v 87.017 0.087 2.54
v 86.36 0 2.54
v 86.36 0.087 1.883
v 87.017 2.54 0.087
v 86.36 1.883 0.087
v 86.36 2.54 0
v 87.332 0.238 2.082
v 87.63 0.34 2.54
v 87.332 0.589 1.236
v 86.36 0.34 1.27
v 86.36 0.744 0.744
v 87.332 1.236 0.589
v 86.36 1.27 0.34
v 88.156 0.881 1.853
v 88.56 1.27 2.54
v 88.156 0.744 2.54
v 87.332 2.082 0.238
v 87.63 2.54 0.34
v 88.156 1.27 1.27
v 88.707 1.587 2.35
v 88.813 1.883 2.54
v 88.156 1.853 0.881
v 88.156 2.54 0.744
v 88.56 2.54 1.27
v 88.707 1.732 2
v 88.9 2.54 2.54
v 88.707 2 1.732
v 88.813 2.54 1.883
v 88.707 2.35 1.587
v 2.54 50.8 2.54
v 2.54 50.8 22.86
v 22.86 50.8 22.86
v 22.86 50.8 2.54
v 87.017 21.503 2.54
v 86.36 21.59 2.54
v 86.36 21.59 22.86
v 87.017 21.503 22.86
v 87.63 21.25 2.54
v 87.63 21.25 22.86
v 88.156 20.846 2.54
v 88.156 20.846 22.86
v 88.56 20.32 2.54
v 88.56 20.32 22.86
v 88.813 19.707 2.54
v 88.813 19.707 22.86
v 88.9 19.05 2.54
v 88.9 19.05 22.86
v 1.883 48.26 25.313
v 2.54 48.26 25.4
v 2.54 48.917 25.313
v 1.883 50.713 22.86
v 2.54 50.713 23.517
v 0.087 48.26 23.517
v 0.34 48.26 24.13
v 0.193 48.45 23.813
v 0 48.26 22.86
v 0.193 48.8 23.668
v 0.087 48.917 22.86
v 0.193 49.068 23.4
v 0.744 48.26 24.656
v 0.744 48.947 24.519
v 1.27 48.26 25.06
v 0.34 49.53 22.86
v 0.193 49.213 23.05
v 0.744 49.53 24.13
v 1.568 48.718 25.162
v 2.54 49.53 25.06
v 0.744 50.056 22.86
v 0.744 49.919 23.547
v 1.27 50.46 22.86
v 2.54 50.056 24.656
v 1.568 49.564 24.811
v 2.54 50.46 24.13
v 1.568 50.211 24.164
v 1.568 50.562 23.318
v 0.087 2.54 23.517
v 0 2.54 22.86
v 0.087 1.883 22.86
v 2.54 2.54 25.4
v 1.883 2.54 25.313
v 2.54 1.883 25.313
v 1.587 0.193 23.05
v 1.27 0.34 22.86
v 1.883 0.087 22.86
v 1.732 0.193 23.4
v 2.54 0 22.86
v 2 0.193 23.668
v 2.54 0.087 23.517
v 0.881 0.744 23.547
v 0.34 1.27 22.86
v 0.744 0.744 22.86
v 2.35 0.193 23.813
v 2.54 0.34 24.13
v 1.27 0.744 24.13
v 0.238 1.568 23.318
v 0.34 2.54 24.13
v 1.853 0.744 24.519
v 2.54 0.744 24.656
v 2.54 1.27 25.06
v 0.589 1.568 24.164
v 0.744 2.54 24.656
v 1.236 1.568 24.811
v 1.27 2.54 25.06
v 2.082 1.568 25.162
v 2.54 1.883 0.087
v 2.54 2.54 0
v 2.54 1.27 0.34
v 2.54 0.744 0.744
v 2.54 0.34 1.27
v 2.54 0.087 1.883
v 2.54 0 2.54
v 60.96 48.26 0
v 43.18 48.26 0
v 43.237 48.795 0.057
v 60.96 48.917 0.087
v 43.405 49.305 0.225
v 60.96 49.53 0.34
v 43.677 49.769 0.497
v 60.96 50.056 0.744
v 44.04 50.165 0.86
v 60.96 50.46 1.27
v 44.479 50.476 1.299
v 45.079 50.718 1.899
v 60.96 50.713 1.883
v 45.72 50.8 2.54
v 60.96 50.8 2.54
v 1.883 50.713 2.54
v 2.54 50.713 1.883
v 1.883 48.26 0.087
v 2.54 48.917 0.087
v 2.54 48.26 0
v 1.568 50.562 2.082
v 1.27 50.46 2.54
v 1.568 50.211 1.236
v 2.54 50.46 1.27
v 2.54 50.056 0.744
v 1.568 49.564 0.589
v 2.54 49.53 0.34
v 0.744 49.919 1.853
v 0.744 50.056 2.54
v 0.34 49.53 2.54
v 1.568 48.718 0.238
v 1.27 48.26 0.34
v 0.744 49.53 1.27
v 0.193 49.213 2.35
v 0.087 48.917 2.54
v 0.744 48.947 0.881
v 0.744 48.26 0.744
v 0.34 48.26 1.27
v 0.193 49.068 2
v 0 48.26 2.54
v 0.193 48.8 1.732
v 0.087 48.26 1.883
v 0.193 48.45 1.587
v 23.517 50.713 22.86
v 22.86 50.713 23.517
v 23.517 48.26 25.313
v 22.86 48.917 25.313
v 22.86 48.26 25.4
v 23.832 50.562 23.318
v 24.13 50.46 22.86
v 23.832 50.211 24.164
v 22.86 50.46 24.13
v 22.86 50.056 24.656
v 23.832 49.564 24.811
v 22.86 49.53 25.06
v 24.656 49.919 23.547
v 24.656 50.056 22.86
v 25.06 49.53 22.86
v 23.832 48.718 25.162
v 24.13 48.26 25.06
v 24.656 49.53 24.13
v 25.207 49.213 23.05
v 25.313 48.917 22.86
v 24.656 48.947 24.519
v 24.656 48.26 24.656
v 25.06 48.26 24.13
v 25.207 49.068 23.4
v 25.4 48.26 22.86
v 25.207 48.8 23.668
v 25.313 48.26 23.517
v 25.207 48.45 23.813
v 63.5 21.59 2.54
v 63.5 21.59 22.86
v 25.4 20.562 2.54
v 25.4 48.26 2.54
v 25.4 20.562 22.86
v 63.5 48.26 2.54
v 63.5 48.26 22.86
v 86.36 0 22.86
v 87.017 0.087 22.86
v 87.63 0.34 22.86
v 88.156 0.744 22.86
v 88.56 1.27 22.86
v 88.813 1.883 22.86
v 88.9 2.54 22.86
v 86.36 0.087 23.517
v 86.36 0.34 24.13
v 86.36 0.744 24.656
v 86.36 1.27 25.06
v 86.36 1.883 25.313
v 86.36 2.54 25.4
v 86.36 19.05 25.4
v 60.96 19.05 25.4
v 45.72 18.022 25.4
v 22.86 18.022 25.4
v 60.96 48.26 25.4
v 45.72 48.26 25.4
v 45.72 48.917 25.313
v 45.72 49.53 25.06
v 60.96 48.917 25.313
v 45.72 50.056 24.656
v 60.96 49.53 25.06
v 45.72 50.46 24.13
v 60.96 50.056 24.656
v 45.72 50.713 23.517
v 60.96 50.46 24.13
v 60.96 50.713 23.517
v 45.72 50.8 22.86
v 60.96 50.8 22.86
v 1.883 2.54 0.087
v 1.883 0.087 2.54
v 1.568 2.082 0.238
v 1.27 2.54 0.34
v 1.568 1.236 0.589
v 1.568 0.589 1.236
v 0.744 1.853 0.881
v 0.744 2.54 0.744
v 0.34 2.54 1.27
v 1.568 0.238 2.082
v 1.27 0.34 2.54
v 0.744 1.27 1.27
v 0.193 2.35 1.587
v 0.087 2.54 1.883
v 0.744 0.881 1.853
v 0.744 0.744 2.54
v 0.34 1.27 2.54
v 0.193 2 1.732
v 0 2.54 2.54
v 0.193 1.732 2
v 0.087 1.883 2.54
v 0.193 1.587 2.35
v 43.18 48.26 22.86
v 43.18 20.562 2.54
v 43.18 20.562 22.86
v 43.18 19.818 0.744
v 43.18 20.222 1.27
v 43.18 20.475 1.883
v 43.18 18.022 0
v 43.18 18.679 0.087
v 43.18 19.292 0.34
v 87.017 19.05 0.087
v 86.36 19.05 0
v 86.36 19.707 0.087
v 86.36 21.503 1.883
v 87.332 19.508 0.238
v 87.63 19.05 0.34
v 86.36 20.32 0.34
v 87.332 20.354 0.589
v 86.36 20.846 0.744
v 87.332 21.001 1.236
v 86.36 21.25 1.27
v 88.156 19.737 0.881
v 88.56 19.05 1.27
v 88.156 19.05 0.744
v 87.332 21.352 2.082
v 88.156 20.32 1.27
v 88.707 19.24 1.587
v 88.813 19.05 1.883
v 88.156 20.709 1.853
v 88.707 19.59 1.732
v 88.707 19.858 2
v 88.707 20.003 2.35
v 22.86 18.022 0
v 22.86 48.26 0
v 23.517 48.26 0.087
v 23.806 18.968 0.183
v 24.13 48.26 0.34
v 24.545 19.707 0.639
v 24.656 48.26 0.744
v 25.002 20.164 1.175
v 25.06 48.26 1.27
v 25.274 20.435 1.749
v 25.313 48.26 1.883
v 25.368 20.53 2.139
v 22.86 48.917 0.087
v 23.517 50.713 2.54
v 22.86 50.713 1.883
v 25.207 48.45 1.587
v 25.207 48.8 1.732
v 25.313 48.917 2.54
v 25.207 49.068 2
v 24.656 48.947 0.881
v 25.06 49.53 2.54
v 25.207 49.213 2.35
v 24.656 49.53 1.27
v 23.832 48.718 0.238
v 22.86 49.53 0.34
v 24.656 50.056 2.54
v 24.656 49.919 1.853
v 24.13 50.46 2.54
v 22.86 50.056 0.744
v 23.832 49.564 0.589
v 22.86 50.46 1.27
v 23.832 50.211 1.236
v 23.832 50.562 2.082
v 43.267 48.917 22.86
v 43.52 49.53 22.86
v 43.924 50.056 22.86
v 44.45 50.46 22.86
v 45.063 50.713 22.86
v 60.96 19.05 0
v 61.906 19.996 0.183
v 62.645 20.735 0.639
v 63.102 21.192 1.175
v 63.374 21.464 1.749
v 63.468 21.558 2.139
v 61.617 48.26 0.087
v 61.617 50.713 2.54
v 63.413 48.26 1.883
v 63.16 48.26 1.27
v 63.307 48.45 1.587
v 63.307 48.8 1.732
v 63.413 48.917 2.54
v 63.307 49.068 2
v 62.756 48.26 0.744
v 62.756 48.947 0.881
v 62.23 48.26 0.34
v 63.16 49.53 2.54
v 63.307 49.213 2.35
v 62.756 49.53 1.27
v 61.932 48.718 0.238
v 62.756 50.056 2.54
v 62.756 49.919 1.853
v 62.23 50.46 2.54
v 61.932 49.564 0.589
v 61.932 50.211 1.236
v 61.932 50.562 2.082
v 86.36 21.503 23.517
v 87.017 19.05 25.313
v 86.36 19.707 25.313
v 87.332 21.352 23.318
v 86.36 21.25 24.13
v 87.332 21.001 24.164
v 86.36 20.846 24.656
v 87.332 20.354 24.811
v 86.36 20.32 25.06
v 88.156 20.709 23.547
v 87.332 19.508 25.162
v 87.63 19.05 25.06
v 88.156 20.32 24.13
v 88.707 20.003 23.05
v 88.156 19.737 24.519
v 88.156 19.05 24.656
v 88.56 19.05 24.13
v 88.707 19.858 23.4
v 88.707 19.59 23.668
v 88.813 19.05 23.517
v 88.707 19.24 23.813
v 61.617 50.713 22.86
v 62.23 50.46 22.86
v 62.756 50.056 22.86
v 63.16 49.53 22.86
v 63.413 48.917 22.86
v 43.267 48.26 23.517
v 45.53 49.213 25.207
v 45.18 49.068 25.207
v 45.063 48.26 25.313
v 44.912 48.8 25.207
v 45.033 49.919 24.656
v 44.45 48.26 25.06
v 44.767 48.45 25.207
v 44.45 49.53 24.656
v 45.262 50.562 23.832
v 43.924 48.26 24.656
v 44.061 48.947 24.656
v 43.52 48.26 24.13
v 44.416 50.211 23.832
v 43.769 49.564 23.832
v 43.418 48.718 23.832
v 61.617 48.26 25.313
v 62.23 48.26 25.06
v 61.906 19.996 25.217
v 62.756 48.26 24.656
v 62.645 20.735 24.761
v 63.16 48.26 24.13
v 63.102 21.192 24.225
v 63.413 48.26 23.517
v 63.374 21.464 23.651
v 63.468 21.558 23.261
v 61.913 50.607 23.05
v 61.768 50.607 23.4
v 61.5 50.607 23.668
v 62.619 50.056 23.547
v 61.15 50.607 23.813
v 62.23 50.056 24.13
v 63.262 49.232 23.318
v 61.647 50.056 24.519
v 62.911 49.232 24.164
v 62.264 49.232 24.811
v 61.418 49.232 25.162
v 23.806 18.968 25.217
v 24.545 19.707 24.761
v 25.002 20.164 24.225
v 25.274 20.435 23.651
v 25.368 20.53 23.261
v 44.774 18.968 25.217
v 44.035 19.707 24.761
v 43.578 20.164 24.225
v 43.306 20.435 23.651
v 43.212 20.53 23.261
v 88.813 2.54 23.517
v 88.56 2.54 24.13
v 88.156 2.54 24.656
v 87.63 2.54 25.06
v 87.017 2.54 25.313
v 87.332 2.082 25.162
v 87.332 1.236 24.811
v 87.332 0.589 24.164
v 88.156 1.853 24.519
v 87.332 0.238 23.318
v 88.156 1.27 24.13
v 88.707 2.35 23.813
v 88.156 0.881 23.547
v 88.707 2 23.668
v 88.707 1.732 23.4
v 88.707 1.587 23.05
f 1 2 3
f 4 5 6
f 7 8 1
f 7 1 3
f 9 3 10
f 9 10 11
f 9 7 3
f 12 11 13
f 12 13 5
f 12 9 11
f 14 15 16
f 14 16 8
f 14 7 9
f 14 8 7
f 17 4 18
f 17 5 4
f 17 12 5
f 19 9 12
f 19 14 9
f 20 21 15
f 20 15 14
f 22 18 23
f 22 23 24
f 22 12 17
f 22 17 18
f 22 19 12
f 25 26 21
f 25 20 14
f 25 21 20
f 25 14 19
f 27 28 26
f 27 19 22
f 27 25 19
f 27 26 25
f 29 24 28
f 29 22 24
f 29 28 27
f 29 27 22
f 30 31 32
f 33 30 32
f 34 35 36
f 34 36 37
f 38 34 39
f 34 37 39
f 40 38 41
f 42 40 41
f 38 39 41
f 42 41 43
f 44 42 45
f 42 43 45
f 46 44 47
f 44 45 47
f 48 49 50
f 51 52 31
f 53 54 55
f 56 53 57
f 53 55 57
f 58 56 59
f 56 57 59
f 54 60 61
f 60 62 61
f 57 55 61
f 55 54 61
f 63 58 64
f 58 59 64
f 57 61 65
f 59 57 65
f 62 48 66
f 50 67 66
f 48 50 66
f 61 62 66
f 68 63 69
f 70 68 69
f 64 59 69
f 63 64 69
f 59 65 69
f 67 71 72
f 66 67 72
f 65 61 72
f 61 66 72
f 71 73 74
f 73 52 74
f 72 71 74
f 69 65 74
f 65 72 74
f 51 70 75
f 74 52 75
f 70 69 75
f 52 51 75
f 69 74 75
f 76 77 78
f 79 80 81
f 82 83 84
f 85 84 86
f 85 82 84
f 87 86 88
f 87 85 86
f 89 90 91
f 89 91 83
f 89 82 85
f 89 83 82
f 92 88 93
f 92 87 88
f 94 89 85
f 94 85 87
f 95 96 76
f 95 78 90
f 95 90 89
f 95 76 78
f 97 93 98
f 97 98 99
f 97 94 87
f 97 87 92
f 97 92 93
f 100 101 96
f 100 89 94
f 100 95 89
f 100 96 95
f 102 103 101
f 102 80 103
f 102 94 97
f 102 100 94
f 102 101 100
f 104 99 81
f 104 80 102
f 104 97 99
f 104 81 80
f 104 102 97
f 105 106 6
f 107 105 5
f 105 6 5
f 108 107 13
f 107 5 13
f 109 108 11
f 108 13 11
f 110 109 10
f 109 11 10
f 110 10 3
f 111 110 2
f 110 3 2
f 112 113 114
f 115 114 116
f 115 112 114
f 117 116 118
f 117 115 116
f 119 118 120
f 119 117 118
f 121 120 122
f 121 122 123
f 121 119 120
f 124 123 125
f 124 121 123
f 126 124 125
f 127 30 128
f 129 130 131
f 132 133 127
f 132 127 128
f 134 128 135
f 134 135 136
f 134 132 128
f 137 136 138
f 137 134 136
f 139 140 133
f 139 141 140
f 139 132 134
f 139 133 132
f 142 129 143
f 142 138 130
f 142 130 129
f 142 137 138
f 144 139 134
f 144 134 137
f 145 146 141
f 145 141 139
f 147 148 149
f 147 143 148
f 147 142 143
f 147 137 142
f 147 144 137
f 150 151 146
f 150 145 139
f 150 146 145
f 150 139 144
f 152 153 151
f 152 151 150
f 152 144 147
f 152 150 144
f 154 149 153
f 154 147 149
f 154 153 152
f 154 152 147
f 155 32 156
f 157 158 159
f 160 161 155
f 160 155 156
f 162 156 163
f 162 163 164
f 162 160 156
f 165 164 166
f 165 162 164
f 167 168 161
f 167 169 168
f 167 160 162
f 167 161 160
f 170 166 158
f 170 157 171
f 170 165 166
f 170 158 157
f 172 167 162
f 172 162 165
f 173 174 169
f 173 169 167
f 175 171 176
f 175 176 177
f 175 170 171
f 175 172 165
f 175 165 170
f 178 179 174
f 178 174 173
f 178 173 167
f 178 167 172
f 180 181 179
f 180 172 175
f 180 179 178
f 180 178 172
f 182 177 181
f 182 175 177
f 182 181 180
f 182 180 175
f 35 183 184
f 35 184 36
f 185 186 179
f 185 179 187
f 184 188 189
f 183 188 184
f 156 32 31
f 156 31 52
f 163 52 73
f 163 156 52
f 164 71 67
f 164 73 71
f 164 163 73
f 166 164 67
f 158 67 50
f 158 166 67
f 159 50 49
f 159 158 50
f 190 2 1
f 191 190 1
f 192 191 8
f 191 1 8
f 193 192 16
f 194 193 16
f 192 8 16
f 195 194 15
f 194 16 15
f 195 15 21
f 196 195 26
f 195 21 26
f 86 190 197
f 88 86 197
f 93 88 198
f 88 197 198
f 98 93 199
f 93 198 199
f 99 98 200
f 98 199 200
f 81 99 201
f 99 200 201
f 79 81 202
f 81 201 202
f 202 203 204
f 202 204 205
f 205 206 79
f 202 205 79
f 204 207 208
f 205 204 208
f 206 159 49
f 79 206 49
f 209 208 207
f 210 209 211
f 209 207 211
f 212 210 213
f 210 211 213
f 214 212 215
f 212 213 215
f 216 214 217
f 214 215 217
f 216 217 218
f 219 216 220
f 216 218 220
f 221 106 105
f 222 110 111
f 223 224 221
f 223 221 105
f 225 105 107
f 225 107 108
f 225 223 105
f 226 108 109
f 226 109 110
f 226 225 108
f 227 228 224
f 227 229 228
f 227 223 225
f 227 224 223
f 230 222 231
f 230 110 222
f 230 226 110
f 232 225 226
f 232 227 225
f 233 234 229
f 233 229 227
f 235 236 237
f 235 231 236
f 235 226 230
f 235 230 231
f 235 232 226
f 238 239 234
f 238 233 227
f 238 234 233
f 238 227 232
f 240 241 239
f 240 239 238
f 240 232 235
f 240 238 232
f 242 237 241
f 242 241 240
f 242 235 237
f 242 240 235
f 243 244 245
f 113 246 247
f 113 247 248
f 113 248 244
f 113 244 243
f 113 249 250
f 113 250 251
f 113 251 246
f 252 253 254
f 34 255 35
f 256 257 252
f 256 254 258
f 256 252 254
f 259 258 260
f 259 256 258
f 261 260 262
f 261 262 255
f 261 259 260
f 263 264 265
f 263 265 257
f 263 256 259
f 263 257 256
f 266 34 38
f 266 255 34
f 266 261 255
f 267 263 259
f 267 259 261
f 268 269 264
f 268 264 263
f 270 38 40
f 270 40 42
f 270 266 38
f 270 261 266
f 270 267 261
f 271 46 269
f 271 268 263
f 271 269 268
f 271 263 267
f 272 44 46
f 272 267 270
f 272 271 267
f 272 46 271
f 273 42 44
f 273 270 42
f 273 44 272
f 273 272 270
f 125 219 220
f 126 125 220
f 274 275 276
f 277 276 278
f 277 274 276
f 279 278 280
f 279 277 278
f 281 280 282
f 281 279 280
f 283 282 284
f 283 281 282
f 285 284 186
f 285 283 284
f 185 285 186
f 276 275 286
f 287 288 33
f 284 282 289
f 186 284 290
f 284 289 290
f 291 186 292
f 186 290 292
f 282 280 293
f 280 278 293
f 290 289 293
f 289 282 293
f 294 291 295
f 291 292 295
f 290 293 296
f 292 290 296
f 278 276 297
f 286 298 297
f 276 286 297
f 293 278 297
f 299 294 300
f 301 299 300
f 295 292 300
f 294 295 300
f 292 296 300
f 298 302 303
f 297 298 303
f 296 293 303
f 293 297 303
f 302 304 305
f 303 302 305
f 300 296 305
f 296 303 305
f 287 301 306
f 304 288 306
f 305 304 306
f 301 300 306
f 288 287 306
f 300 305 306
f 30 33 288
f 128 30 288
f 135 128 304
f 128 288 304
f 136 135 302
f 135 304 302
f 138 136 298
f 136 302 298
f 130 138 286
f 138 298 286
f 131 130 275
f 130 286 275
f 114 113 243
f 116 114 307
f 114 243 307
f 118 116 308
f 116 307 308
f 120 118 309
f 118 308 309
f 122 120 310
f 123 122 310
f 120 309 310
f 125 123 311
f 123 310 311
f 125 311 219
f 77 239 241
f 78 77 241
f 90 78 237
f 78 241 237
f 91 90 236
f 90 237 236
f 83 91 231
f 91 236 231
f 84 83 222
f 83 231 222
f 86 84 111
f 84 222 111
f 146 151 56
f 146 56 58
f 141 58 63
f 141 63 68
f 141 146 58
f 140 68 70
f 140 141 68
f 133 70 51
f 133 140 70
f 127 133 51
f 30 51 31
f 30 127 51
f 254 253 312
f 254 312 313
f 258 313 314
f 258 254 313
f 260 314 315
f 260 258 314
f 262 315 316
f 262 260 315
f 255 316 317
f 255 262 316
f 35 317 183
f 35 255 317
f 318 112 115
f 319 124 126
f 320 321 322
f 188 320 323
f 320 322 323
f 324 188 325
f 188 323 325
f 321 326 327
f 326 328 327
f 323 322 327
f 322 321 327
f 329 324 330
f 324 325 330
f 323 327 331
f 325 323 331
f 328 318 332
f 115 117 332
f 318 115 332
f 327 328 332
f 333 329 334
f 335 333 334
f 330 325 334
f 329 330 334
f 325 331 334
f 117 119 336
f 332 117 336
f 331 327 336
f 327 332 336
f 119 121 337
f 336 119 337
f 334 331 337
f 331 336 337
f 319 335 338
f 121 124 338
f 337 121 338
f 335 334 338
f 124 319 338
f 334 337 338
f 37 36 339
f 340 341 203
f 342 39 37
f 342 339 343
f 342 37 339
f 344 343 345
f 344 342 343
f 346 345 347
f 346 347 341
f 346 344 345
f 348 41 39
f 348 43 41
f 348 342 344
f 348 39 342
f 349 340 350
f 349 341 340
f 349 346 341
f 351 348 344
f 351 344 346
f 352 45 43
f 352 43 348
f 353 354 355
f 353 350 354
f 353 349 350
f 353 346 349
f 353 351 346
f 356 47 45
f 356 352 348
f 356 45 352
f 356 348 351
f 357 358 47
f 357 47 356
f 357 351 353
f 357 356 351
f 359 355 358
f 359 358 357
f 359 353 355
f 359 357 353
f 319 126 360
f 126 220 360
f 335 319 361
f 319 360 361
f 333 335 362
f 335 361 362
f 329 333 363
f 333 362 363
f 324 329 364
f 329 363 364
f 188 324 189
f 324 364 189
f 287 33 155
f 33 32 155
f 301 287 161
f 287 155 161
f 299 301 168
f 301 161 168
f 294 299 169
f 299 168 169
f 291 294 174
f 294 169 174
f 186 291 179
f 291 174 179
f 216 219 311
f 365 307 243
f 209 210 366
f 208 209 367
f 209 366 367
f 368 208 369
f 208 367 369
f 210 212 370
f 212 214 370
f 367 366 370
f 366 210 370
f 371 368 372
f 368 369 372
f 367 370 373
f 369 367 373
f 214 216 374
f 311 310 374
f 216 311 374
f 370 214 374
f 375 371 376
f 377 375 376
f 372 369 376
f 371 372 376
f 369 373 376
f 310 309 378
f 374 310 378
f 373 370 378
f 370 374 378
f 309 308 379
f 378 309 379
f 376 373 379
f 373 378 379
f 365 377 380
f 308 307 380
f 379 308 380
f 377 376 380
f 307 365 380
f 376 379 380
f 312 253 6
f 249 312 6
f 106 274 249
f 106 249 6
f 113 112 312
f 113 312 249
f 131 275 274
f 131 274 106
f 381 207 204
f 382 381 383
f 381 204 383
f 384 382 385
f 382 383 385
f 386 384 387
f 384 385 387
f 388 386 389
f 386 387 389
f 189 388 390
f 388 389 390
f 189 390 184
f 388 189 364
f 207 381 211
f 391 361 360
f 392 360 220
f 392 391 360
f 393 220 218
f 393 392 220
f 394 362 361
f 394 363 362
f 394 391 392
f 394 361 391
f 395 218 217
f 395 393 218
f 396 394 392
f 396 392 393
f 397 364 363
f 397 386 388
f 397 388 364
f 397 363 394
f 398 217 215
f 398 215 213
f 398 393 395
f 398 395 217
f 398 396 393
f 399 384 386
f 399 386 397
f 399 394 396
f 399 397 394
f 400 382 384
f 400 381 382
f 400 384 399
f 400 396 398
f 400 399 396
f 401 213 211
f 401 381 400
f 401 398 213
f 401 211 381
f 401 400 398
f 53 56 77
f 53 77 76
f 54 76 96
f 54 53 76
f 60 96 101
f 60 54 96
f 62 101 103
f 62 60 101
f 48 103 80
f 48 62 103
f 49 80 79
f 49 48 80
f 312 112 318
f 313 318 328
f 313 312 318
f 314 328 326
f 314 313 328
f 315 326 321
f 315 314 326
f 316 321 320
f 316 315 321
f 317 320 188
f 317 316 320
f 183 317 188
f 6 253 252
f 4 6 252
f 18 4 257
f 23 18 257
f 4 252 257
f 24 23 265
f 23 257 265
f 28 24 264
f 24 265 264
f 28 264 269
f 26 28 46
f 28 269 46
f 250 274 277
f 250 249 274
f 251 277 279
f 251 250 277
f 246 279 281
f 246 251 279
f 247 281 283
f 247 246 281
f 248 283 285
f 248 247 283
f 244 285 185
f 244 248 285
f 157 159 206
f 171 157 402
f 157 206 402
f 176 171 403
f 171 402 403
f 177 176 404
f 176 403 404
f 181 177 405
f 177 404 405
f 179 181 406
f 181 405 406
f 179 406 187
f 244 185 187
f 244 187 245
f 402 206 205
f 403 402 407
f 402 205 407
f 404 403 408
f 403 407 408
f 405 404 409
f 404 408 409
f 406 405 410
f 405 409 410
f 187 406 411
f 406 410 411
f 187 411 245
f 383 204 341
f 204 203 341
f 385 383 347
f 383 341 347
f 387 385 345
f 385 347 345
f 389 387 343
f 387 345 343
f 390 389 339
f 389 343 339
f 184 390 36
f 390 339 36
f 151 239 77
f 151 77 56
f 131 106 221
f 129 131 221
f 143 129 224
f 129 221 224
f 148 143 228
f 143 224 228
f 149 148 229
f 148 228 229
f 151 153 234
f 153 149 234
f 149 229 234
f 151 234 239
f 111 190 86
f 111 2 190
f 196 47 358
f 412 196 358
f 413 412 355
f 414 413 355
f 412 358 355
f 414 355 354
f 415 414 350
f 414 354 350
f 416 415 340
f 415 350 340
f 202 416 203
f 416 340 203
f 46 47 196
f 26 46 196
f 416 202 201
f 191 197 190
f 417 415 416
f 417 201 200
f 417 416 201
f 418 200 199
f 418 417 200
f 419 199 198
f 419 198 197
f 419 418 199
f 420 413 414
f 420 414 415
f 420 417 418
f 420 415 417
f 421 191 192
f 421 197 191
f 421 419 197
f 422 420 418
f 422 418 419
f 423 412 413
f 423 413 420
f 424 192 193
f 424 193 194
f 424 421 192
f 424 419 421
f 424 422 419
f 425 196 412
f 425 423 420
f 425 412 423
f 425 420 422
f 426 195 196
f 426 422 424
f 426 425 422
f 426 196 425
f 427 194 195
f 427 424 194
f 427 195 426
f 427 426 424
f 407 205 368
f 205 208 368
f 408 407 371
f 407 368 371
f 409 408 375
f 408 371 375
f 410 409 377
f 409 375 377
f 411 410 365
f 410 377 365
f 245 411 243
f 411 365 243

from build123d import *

# Parameters (mm, degrees)
BOSS_EXTRUDE2_DEPTH = 25.4
FILLET4_R           = 2.54
FILLET5_R           = 2.54
FILLET6_R           = 2.54


with BuildPart() as part:
    # Sketch1 → Boss-Extrude2 (new body)
    with BuildSketch(Plane.XY):
        Polygon((0, 0), (0, 50.8), (25.4, 50.8), (25.4, 20.561904762), (43.18, 20.561904762), (43.18, 50.8), (63.5, 50.8), (63.5, 21.59), (88.9, 21.59), (88.9, 0), align=None)
    extrude(amount=BOSS_EXTRUDE2_DEPTH)

    # Fillet4
    fillet4_edges = [part.edges().sort_by_distance(p)[0] for p in [
        (12.7, 50.8, 25.4),
    ]]
    fillet(fillet4_edges, radius=FILLET4_R)

    # Fillet5
    fillet5_edges = [part.edges().sort_by_distance(p)[0] for p in [
        (12.7, 50.8, 0),
        (25.4, 35.680952381, 0),
        (34.29, 20.561904762, 0),
        (53.34, 50.8, 0),
        (63.5, 36.195, 0),
        (76.2, 21.59, 25.4),
        (76.2, 21.59, 0),
        (63.5, 36.195, 25.4),
        (43.18, 50.8, 12.7),
        (63.5, 50.8, 12.7),
        (88.9, 21.59, 12.7),
        (53.34, 50.8, 25.4),
        (43.18, 35.680952381, 25.4),
        (34.29, 20.561904762, 25.4),
        (0, 24.13, 25.4),
        (0, 50.8, 11.43),
        (0, 50.056051224, 24.656051224),
        (25.4, 50.8, 11.43),
        (25.4, 50.056051224, 24.656051224),
        (25.4, 34.410952381, 25.4),
    ]]
    fillet(fillet5_edges, radius=FILLET5_R)

    # Fillet6
    # the kernel refuses this fillet: 2.54 mm, written as the material it takes off along each edge
    with BuildSketch(Plane(origin=(86.36, 19.05, 2.54), x_dir=(0, 0, -1), z_dir=(1, 0, 0))) as fillet6_piece_1_section:
        Polygon((0, 0), (FILLET6_R, 0), (FILLET6_R, FILLET6_R), (0, FILLET6_R), align=None)
    fillet6_piece_1 = extrude(amount=FILLET6_R, mode=Mode.PRIVATE)
    fillet6_piece_1 = fillet6_piece_1 - Plane(origin=(86.36, 19.05, 2.54), x_dir=(0, -0.7071067811865475, 0.7071067811865475), z_dir=(1, 0, 0)) * Sphere(FILLET6_R, mode=Mode.PRIVATE)
    add(fillet6_piece_1, mode=Mode.SUBTRACT)
    with BuildSketch(Plane(origin=(86.36, 19.05, 22.86), x_dir=(0, 0, 1), z_dir=(1, 0, 0))) as fillet6_piece_2_section:
        Polygon((0, 0), (FILLET6_R, 0), (FILLET6_R, -FILLET6_R), (0, -FILLET6_R), align=None)
    fillet6_piece_2 = extrude(amount=FILLET6_R, mode=Mode.PRIVATE)
    fillet6_piece_2 = fillet6_piece_2 - Plane(origin=(86.36, 19.05, 22.86), x_dir=(0, -0.7071067811865475, -0.7071067811865475), z_dir=(1, 0, 0)) * Sphere(FILLET6_R, mode=Mode.PRIVATE)
    add(fillet6_piece_2, mode=Mode.SUBTRACT)
    with BuildSketch(Plane(origin=(2.54, 48.26, 2.54), x_dir=(0, 0, -1), z_dir=(-1, 0, 0))) as fillet6_piece_3_section:
        Polygon((0, 0), (FILLET6_R, 0), (FILLET6_R, -FILLET6_R), (0, -FILLET6_R), align=None)
    fillet6_piece_3 = extrude(amount=FILLET6_R, mode=Mode.PRIVATE)
    fillet6_piece_3 = fillet6_piece_3 - Plane(origin=(2.54, 48.26, 2.54), x_dir=(0, -0.7071067811865475, 0.7071067811865475), z_dir=(-1, 0, 0)) * Sphere(FILLET6_R, mode=Mode.PRIVATE)
    add(fillet6_piece_3, mode=Mode.SUBTRACT)
    with BuildSketch(Plane(origin=(86.36, 2.54, 2.54), x_dir=(0, -1, 0), z_dir=(1, 0, 0))) as fillet6_piece_4_section:
        Polygon((0, 0), (FILLET6_R, 0), (FILLET6_R, FILLET6_R), (0, FILLET6_R), align=None)
    fillet6_piece_4 = extrude(amount=FILLET6_R, mode=Mode.PRIVATE)
    fillet6_piece_4 = fillet6_piece_4 - Plane(origin=(86.36, 2.54, 2.54), x_dir=(0, 0.7071067811865475, 0.7071067811865475), z_dir=(1, 0, 0)) * Sphere(FILLET6_R, mode=Mode.PRIVATE)
    add(fillet6_piece_4, mode=Mode.SUBTRACT)
    with BuildSketch(Plane(origin=(2.54, 2.54, 2.54), x_dir=(0, -1, 0), z_dir=(-1, 0, 0))) as fillet6_piece_5_section:
        Polygon((0, 0), (FILLET6_R, 0), (FILLET6_R, -FILLET6_R), (0, -FILLET6_R), align=None)
    fillet6_piece_5 = extrude(amount=FILLET6_R, mode=Mode.PRIVATE)
    fillet6_piece_5 = fillet6_piece_5 - Plane(origin=(2.54, 2.54, 2.54), x_dir=(0, 0.7071067811865475, 0.7071067811865475), z_dir=(-1, 0, 0)) * Sphere(FILLET6_R, mode=Mode.PRIVATE)
    add(fillet6_piece_5, mode=Mode.SUBTRACT)
    with BuildSketch(Plane(origin=(86.36, 2.54, 22.86), x_dir=(0, 0, 1), z_dir=(1, 0, 0))) as fillet6_piece_6_section:
        Polygon((0, 0), (FILLET6_R, 0), (FILLET6_R, FILLET6_R), (0, FILLET6_R), align=None)
    fillet6_piece_6 = extrude(amount=FILLET6_R, mode=Mode.PRIVATE)
    fillet6_piece_6 = fillet6_piece_6 - Plane(origin=(86.36, 2.54, 22.86), x_dir=(0, 0.7071067811865475, -0.7071067811865475), z_dir=(1, 0, 0)) * Sphere(FILLET6_R, mode=Mode.PRIVATE)
    add(fillet6_piece_6, mode=Mode.SUBTRACT)
    with BuildSketch(Plane(origin=(88.9, 19.05, 0), x_dir=(0, 0, 1), z_dir=(0, -1, 0))) as fillet6_piece_7:
        with BuildLine():
            CenterArc((FILLET6_R, FILLET6_R), FILLET6_R, 180, 90)
            Line((0, FILLET6_R), (0, 0))
            Line((0, 0), (FILLET6_R, 0))
        make_face()
    extrude(amount=16.51, mode=Mode.SUBTRACT)
    with BuildSketch(Plane(origin=(86.36, 0, 0), x_dir=(0, 0, 1), z_dir=(-1, 0, 0)), Plane(origin=(86.36, 0, 25.4), x_dir=(0, 1, 0), z_dir=(-1, 0, 0))) as fillet6_piece_8:
        with BuildLine():
            CenterArc((FILLET6_R, FILLET6_R), FILLET6_R, 180, 90)
            Line((0, FILLET6_R), (0, 0))
            Line((0, 0), (FILLET6_R, 0))
        make_face()
    extrude(amount=83.82, mode=Mode.SUBTRACT)
    with BuildSketch(Plane(origin=(88.9, 0, 2.54), x_dir=(0, 1, 0), z_dir=(0, 0, 1))) as fillet6_piece_9:
        with BuildLine():
            CenterArc((FILLET6_R, FILLET6_R), FILLET6_R, 180, 90)
            Line((0, FILLET6_R), (0, 0))
            Line((0, 0), (FILLET6_R, 0))
        make_face()
    extrude(amount=20.32, mode=Mode.SUBTRACT)
    with BuildSketch(Plane(origin=(0, 0, 2.54), x_dir=(0, 1, 0), z_dir=(0, 0, 1))) as fillet6_piece_10:
        with BuildLine():
            CenterArc((FILLET6_R, -FILLET6_R), FILLET6_R, 90, 90)
            Line((0, -FILLET6_R), (0, 0))
            Line((0, 0), (FILLET6_R, 0))
        make_face()
    extrude(amount=20.32, mode=Mode.SUBTRACT)
    with BuildSketch(Plane(origin=(2.54, 0, 22.86), x_dir=(-1, 0, 0), z_dir=(0, 0, -1))) as fillet6_piece_11:
        with BuildLine():
            CenterArc((2.54 - FILLET6_R, FILLET6_R), FILLET6_R, 270, 90)
            Line((2.54 - FILLET6_R, 0), (2.54, 0))
            Line((2.54, 0), (2.54, FILLET6_R))
        make_face()
    revolve(axis=Axis((2.54, 0, 22.86), (0, 1, 0)), revolution_arc=90, mode=Mode.SUBTRACT)
    with BuildSketch(Plane(origin=(0, 2.54, 0), x_dir=(0, 0, 1), z_dir=(0, 1, 0))) as fillet6_piece_12:
        with BuildLine():
            CenterArc((FILLET6_R, FILLET6_R), FILLET6_R, 180, 90)
            Line((0, FILLET6_R), (0, 0))
            Line((0, 0), (FILLET6_R, 0))
        make_face()
    extrude(amount=45.72, mode=Mode.SUBTRACT)
    with BuildSketch(Plane(origin=(88.9, 19.05, 25.4), x_dir=(0, 0, -1), z_dir=(0, -1, 0))) as fillet6_piece_13:
        with BuildLine():
            CenterArc((FILLET6_R, -FILLET6_R), FILLET6_R, 90, 90)
            Line((0, -FILLET6_R), (0, 0))
            Line((0, 0), (FILLET6_R, 0))
        make_face()
    extrude(amount=16.51, mode=Mode.SUBTRACT)


solid = part.part
